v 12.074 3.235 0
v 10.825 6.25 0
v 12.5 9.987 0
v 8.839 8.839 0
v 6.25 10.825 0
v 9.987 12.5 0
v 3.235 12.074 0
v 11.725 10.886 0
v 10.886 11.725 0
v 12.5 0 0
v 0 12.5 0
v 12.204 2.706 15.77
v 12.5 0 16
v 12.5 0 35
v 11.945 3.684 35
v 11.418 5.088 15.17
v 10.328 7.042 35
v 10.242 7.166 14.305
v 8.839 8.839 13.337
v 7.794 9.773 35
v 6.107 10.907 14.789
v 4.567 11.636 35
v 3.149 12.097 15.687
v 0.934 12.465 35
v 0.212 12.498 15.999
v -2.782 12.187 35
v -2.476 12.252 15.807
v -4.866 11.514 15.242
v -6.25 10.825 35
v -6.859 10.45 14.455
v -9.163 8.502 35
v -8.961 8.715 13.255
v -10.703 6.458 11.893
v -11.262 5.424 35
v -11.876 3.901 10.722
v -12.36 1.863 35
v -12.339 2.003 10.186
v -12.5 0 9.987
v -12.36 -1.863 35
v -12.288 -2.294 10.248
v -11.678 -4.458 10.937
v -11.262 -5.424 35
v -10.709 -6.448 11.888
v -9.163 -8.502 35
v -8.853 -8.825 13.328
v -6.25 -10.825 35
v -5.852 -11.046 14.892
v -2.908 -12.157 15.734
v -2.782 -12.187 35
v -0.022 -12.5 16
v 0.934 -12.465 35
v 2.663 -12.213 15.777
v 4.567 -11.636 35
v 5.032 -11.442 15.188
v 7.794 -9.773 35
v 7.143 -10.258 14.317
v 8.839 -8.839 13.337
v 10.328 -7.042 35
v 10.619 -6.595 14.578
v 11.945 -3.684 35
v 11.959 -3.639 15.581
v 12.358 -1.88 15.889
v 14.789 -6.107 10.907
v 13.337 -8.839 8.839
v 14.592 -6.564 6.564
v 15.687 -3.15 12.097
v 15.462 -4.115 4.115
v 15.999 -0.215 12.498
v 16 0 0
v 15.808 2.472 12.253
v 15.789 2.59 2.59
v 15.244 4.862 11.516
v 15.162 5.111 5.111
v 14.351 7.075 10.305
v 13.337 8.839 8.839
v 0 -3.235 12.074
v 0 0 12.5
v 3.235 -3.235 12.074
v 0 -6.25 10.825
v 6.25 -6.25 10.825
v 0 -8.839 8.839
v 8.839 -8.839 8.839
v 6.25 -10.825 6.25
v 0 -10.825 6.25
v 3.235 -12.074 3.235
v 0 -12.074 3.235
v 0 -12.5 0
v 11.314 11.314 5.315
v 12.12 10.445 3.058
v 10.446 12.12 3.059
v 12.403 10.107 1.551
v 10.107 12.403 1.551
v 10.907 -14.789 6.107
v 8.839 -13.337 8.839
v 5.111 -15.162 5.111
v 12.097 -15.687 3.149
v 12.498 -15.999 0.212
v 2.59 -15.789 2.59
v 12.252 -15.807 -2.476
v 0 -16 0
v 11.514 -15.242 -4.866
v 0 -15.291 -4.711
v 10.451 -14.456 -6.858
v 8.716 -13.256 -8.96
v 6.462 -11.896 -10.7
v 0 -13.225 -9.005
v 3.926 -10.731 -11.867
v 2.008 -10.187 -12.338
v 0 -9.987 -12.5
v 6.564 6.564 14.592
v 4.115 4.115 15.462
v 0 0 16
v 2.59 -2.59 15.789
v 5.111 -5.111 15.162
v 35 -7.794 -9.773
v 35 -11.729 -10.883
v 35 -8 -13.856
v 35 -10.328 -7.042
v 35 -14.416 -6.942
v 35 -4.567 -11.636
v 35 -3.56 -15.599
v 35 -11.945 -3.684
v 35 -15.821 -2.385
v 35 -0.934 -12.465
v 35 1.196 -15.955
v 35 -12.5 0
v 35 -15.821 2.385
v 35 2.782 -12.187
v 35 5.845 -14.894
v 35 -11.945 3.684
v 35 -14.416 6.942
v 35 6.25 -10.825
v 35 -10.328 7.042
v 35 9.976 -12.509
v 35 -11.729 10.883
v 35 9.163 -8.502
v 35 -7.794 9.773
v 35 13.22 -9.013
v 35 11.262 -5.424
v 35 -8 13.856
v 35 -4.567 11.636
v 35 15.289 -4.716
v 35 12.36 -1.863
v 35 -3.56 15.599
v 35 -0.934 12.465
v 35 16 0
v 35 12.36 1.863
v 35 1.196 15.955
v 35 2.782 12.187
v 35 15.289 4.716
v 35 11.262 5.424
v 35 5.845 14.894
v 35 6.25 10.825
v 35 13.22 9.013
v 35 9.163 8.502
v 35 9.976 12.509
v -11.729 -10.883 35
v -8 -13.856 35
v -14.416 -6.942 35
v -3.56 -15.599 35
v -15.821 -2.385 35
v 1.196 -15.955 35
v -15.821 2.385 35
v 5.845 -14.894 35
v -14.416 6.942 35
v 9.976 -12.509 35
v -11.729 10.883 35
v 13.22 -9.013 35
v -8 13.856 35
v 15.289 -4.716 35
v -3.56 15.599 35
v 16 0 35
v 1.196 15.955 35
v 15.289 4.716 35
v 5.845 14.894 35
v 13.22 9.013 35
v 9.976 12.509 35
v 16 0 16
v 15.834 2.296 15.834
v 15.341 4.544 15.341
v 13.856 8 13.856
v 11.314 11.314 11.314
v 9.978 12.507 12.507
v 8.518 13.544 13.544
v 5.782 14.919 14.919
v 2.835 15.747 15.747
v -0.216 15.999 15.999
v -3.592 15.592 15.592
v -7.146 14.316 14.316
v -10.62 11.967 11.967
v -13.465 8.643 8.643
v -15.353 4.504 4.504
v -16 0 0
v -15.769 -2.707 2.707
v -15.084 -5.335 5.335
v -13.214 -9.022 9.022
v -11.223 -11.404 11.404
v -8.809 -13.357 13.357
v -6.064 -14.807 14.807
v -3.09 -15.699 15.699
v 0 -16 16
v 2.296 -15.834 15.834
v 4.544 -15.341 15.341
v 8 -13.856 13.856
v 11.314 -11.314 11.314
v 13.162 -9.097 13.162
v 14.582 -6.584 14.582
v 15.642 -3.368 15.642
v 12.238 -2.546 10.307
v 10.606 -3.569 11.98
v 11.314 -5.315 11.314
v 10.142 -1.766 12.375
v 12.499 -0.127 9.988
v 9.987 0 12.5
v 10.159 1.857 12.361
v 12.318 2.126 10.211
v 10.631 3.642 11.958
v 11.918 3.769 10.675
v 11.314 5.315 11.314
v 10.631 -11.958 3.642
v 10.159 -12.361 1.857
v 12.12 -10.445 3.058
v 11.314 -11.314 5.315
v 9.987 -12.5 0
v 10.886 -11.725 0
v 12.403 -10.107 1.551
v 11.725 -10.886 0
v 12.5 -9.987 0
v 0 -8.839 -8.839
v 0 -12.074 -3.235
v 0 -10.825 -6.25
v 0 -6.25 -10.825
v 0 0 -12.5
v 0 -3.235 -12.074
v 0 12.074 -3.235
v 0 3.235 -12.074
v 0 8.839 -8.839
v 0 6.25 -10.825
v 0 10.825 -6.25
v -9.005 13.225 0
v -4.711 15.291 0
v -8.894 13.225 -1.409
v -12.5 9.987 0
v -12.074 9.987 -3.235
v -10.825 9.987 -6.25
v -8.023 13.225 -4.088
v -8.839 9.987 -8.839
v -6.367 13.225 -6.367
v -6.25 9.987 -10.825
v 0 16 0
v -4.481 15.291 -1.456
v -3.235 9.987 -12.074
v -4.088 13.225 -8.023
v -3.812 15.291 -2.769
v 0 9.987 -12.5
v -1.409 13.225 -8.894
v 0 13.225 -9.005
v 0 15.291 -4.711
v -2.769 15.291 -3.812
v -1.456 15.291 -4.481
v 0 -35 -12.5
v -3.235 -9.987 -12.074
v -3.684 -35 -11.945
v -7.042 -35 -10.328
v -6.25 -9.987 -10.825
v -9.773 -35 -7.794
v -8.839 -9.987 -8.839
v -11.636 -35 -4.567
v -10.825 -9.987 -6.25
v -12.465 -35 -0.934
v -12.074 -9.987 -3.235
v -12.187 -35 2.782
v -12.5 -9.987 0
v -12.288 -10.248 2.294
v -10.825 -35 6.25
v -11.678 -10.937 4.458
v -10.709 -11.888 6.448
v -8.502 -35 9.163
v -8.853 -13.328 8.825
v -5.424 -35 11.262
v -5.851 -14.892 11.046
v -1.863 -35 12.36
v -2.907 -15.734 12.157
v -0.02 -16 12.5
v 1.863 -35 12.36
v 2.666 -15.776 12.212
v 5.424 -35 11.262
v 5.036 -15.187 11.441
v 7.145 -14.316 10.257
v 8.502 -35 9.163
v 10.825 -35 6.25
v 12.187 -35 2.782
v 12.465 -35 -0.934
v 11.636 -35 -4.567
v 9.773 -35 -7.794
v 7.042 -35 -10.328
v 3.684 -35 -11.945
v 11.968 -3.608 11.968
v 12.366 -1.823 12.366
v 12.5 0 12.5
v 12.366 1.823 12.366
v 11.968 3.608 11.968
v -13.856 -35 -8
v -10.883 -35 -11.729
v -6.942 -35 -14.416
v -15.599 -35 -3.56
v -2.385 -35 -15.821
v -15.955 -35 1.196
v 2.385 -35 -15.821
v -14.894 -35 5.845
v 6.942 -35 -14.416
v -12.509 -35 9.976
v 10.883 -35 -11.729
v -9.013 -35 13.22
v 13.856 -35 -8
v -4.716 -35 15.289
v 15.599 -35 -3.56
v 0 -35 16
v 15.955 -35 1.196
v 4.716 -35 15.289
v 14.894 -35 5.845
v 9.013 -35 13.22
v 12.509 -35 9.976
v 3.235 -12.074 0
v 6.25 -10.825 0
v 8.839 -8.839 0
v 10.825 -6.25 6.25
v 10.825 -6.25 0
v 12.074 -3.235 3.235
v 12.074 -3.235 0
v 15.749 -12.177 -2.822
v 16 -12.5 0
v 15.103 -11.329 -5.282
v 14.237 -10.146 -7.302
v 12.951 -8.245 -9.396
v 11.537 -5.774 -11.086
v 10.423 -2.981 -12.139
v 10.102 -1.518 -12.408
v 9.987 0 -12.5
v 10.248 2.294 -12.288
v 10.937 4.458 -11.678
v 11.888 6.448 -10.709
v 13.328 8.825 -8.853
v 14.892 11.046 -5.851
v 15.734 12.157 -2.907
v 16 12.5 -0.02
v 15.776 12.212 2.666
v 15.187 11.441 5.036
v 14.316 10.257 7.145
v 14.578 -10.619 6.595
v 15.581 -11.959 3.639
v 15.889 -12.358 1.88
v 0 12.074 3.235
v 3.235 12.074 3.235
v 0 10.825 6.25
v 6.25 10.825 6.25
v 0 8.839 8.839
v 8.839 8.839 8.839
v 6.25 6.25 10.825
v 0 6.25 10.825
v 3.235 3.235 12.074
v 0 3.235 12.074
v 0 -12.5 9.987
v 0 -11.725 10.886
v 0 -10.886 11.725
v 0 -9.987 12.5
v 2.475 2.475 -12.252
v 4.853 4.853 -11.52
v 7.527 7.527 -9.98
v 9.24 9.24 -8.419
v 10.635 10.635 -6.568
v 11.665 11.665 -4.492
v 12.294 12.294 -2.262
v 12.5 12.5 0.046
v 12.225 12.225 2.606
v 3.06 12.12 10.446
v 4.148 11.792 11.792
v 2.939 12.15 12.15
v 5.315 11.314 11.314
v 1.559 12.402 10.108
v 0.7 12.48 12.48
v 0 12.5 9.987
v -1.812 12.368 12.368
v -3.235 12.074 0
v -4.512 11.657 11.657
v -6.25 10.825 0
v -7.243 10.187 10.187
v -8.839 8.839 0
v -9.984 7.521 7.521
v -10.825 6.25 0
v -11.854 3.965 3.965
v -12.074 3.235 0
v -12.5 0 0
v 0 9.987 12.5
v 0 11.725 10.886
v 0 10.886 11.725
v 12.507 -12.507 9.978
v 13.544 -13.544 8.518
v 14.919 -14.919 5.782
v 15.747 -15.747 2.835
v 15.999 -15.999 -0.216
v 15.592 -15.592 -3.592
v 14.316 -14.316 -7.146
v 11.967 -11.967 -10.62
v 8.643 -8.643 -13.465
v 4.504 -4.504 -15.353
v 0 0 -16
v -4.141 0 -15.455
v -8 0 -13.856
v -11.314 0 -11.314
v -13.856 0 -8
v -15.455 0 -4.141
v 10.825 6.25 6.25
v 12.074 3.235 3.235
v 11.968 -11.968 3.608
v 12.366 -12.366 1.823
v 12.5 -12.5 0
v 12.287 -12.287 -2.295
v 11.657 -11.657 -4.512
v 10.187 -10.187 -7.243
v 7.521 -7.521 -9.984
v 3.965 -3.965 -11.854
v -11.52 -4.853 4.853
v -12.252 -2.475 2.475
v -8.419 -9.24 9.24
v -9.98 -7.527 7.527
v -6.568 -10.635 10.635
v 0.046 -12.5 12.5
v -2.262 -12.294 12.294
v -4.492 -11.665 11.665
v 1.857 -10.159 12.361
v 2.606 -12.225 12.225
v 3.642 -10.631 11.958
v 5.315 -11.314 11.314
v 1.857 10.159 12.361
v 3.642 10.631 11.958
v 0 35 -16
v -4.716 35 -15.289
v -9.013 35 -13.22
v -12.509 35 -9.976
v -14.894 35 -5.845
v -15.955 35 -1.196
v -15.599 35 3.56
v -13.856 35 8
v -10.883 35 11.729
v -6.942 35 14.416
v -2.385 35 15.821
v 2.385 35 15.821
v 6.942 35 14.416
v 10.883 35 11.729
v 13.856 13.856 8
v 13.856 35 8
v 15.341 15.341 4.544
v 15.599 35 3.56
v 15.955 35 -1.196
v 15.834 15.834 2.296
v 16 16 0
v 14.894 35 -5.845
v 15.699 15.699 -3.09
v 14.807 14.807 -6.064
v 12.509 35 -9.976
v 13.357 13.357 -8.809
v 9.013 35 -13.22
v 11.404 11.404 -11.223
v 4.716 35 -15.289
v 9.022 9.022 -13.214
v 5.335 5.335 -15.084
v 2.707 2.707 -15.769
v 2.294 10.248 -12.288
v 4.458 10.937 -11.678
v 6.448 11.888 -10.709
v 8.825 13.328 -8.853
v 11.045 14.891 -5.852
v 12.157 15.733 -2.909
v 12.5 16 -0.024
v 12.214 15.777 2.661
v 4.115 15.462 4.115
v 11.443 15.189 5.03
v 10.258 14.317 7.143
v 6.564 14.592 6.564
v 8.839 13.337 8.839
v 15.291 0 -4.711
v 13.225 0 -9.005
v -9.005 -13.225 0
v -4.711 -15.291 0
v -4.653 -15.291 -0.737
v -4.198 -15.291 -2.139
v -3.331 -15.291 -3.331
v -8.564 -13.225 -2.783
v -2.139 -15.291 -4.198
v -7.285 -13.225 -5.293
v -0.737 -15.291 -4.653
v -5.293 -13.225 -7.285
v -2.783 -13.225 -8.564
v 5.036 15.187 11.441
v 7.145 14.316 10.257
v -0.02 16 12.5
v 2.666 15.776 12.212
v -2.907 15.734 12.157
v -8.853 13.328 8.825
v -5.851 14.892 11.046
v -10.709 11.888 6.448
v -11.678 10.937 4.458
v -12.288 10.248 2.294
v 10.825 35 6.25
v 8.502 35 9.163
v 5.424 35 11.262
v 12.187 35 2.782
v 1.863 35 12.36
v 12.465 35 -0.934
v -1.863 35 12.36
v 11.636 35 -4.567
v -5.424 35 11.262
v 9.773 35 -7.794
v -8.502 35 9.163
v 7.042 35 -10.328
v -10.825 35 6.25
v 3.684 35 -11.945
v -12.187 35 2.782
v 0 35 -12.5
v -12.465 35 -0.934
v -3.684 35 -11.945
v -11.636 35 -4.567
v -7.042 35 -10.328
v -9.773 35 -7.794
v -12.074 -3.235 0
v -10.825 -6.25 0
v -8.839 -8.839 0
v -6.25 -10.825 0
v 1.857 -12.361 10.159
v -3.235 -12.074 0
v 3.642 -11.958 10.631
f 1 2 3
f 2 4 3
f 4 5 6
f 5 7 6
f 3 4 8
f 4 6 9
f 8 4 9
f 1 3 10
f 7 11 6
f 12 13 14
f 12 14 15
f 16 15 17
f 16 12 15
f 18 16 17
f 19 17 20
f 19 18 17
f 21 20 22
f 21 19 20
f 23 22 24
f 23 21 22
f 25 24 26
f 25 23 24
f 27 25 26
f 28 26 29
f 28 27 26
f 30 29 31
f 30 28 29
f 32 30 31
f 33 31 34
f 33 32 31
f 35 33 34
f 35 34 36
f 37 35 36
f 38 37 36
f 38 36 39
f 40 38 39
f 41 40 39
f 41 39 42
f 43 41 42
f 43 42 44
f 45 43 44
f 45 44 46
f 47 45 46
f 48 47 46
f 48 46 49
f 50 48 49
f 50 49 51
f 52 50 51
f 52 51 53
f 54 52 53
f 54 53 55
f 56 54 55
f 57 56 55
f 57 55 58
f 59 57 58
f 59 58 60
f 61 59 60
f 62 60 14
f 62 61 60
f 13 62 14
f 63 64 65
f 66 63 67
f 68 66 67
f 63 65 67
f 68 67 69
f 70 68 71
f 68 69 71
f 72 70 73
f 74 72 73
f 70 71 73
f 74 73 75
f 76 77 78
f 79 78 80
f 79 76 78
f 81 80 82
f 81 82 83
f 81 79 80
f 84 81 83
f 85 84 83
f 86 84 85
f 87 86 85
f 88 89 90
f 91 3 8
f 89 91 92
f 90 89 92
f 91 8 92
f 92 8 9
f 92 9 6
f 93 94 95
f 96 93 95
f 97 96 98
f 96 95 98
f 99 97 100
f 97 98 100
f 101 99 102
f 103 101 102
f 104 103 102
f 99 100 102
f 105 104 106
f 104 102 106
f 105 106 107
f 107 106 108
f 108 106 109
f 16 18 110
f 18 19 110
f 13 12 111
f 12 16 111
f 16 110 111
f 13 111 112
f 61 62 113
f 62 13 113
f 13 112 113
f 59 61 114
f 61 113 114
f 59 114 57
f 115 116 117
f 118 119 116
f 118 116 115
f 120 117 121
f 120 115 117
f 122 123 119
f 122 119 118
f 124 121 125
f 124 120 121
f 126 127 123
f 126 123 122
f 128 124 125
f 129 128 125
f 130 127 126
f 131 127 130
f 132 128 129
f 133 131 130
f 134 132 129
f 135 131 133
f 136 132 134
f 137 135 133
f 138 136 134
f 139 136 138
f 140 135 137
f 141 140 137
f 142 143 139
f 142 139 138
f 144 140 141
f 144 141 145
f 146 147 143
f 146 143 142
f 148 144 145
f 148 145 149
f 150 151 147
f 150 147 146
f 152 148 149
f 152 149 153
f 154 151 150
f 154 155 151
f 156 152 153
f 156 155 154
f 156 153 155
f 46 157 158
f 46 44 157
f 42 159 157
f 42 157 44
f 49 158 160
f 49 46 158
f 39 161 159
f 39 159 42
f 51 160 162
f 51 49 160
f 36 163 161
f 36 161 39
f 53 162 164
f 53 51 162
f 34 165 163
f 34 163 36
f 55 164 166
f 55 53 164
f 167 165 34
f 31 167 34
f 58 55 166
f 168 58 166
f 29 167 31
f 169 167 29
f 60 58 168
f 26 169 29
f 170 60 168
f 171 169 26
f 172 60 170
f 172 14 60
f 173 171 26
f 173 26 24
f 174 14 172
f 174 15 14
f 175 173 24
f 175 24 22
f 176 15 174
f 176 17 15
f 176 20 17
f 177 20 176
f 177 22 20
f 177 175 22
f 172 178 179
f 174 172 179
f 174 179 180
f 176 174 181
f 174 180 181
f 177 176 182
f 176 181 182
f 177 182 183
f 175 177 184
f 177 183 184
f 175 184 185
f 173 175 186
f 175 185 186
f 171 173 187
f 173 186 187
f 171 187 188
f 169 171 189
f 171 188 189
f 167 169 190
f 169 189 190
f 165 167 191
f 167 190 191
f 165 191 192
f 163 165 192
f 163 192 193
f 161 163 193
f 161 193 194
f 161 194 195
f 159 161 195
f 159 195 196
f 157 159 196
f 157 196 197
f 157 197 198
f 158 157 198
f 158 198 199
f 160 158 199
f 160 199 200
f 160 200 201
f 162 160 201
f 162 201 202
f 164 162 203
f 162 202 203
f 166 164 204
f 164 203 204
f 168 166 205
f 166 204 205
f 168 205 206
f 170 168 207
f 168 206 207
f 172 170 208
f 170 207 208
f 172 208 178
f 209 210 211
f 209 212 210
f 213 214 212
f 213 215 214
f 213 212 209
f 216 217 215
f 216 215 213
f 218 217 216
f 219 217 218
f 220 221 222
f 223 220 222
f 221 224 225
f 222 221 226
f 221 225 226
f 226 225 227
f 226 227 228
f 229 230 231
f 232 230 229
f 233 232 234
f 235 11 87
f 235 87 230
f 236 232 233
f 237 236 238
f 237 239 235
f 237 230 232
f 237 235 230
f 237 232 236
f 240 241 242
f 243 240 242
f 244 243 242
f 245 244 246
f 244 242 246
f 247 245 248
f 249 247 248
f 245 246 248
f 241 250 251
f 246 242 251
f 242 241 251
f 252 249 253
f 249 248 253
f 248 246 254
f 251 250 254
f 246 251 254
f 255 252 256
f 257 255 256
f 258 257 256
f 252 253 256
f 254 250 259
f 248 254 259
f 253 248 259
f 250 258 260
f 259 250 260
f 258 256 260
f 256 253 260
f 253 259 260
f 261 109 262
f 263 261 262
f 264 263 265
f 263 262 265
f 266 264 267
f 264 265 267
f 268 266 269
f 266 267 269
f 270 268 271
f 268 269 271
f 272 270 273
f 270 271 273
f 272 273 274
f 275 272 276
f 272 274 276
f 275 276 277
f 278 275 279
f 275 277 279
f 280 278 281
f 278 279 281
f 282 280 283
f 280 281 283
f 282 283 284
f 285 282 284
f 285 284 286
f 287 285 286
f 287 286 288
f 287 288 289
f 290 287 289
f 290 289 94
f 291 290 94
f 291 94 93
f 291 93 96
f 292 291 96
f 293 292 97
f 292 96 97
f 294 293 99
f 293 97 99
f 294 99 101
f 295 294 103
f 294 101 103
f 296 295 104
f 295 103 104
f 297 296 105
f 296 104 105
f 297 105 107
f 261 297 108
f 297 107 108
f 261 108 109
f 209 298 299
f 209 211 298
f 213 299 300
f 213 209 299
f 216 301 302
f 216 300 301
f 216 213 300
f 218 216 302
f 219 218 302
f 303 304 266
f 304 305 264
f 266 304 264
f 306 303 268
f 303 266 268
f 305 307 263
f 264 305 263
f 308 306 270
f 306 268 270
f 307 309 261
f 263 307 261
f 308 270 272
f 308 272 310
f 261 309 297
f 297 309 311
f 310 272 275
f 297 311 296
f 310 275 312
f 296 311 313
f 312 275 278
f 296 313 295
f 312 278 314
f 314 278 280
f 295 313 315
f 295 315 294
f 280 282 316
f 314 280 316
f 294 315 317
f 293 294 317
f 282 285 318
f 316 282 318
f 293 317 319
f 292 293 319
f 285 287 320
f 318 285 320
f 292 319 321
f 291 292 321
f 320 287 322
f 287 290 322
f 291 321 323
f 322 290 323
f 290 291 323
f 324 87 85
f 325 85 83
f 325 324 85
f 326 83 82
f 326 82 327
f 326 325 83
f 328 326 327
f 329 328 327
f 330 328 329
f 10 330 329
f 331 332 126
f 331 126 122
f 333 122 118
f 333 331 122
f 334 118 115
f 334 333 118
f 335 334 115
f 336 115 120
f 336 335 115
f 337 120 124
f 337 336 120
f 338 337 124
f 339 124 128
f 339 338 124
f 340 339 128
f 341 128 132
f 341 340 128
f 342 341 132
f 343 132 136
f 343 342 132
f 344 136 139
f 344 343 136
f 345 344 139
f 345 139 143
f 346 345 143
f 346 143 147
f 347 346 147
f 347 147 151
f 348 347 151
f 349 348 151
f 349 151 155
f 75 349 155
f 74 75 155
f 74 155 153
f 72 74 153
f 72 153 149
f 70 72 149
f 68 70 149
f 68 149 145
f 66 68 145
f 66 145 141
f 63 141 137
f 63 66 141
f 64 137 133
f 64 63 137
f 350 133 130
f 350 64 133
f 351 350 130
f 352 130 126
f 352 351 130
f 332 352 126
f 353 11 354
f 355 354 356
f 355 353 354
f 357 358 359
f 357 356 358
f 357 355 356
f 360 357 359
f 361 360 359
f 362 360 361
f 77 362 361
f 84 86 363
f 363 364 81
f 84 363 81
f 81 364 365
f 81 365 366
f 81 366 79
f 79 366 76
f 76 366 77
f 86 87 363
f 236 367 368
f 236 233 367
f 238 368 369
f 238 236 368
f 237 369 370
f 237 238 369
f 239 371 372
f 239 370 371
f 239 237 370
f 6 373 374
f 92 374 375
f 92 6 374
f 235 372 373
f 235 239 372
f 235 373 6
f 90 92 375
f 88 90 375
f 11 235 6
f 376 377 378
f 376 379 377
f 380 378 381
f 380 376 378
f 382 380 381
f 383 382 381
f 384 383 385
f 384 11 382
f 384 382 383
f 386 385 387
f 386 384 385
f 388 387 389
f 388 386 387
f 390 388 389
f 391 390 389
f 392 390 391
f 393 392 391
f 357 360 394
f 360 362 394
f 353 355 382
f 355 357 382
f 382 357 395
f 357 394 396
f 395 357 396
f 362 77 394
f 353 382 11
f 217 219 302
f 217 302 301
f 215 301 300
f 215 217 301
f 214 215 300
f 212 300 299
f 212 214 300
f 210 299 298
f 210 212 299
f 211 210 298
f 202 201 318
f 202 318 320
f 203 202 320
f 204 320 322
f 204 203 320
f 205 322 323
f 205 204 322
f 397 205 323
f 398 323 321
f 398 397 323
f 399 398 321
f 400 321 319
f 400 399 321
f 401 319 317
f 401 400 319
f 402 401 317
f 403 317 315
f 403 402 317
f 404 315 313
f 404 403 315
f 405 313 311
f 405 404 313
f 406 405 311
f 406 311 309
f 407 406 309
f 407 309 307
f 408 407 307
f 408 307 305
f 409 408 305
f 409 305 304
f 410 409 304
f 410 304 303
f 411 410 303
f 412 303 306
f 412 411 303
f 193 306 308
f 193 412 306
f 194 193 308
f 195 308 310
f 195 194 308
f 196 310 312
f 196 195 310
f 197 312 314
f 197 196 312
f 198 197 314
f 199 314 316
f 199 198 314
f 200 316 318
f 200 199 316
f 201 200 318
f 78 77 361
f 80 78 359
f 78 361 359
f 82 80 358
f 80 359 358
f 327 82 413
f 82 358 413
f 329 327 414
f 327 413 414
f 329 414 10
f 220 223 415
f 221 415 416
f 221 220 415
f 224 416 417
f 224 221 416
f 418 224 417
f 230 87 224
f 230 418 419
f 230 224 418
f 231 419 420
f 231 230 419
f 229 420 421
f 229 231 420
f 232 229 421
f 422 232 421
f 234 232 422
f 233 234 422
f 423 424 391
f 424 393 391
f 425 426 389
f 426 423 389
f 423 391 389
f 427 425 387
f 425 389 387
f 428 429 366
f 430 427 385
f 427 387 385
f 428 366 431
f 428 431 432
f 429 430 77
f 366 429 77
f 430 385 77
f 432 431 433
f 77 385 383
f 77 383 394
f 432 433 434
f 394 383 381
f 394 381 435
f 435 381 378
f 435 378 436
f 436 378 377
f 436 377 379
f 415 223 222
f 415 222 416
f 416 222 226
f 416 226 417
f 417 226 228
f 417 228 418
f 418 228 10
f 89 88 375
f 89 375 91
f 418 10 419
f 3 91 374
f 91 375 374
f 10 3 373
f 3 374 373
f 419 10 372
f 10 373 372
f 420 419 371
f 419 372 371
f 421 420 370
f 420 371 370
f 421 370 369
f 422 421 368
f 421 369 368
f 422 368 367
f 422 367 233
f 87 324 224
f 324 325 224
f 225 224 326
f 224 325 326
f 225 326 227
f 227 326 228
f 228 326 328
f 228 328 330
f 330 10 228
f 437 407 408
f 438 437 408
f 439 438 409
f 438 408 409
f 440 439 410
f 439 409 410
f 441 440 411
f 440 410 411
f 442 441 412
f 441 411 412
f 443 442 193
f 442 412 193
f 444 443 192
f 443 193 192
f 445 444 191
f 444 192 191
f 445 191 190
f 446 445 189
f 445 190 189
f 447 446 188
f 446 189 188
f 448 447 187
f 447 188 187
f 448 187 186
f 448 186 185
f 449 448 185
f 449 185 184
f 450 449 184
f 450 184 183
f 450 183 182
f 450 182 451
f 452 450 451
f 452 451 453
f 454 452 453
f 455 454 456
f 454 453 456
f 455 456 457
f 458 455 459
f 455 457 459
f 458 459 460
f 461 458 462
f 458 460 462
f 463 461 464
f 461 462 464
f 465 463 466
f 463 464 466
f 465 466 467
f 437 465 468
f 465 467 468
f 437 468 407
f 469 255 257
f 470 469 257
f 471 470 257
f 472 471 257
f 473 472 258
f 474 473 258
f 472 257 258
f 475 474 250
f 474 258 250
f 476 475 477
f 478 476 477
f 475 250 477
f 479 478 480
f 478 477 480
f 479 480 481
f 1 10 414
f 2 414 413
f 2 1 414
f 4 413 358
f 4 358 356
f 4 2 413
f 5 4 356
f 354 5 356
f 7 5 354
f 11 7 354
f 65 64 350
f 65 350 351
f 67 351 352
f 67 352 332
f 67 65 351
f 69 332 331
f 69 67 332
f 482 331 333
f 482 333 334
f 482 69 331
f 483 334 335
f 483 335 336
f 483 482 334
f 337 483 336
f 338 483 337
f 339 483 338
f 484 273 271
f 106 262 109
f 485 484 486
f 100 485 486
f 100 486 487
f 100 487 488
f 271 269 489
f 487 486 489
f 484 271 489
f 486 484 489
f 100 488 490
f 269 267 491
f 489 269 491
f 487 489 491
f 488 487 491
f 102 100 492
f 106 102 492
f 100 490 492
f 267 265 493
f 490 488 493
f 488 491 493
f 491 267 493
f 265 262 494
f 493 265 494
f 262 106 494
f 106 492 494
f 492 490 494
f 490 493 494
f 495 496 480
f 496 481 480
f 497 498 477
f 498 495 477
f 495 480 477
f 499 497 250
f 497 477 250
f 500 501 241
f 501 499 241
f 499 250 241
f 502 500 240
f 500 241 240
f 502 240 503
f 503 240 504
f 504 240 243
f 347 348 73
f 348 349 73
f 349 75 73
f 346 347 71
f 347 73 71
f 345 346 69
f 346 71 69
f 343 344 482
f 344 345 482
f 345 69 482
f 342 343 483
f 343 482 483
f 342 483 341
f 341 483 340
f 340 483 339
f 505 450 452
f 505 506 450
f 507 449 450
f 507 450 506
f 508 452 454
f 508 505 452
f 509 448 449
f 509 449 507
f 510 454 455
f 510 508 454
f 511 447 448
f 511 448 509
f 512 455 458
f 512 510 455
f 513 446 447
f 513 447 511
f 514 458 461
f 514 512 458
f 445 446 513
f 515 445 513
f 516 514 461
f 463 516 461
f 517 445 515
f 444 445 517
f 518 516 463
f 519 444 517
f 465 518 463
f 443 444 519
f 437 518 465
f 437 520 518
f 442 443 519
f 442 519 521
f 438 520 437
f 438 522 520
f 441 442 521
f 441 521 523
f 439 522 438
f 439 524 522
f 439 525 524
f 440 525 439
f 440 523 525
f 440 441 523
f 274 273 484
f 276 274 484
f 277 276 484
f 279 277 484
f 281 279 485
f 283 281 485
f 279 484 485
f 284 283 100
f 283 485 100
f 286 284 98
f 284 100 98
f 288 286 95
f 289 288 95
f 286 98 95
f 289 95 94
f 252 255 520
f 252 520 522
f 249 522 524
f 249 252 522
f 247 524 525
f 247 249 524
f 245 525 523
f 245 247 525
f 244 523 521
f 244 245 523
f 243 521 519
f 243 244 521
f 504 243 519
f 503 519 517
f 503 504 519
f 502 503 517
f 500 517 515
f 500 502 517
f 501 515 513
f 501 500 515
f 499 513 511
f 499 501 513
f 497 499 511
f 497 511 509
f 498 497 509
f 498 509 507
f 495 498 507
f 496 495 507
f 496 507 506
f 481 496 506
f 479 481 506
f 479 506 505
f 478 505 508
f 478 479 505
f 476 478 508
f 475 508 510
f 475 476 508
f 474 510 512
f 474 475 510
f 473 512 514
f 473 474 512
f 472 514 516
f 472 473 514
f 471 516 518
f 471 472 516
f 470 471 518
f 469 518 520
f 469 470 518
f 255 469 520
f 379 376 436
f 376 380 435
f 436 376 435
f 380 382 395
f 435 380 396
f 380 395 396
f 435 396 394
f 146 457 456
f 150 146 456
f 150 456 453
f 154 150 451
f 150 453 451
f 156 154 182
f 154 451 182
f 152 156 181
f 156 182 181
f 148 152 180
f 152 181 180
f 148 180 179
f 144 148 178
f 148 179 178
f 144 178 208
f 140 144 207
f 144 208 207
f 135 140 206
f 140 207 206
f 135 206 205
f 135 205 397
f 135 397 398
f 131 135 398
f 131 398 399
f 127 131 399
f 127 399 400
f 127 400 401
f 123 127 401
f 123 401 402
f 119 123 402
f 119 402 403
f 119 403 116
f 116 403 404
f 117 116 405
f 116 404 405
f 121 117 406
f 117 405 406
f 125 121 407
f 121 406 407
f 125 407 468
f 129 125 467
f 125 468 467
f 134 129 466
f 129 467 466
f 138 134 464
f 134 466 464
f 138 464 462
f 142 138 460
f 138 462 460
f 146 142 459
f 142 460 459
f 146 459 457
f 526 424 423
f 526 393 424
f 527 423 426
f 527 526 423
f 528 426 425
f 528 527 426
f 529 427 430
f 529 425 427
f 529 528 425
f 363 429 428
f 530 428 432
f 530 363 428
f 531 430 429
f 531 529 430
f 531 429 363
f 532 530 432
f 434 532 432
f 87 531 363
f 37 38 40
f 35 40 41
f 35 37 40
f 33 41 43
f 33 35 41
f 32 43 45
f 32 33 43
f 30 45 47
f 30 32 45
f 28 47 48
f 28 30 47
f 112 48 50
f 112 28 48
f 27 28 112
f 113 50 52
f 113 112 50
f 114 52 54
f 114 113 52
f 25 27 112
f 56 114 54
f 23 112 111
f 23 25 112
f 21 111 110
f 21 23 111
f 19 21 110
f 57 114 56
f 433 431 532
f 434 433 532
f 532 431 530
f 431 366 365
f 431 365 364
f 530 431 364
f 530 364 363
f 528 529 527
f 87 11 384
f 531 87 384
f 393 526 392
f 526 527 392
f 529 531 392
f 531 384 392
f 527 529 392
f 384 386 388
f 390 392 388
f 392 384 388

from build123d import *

# Parameters (mm, degrees)
SKETCH_1_R      = 16
SKETCH_1_R_2    = 12.5
EXTRUDE_1_DEPTH = 35
SKETCH_2_R      = 16
SKETCH_2_R_2    = 12.5
EXTRUDE_2_DEPTH = 35
SKETCH_4_R      = 16
SKETCH_4_R_2    = 12.5
EXTRUDE_3_DEPTH = 35
REVOLVE_1_ANGLE = 90
SKETCH_5_R      = 16
SKETCH_5_R_2    = 12.5
EXTRUDE_4_DEPTH = 35


with BuildPart() as part:
    # 草图1 → 凸台-拉伸1 (new body)
    with BuildSketch(Plane.XY):
        Circle(SKETCH_1_R)
        Circle(SKETCH_1_R_2, mode=Mode.SUBTRACT)
    extrude(amount=EXTRUDE_1_DEPTH)

    # 草图2 → 凸台-拉伸2 (add)
    with BuildSketch(Plane(origin=(0, 0, 0), x_dir=(0, 0, -1), z_dir=(1, 0, 0))):
        with Locations(Location((0, 0, 0), (0, 0, 90))):
            Circle(SKETCH_2_R)
        with Locations(Location((0, 0, 0), (0, 0, 270))):
            Circle(SKETCH_2_R_2, mode=Mode.SUBTRACT)
    extrude(amount=EXTRUDE_2_DEPTH)

    # 草图4 → 凸台-拉伸3 (add)
    with BuildSketch(Plane(origin=(0, 0, 0), x_dir=(1, 0, 0), z_dir=(0, 1, 0))):
        with Locations(Location((0, 0, 0), (0, 0, 90))):
            Circle(SKETCH_4_R)
        with Locations(Location((0, 0, 0), (0, 0, 90))):
            Circle(SKETCH_4_R_2, mode=Mode.SUBTRACT)
    extrude(amount=EXTRUDE_3_DEPTH)

    # 草图3 → 旋转1 (revolve)
    with BuildSketch(Plane.XY):
        with BuildLine():
            Line((0, 16), (0, -16))
            ThreePointArc((0, -16), (-16, 0), (0, 16))
        make_face()
    revolve(axis=Axis((0, 16, 0), (0, -1, 0)), revolution_arc=REVOLVE_1_ANGLE)

    # 草图5 → 凸台-拉伸4 (add)
    with BuildSketch(Plane(origin=(0, 0, 0), x_dir=(1, 0, 0), z_dir=(0, 1, 0))):
        with Locations(Location((0, 0, 0), (0, 0, 270))):
            Circle(SKETCH_5_R)
        with Locations(Location((0, 0, 0), (0, 0, 90))):
            Circle(SKETCH_5_R_2, mode=Mode.SUBTRACT)
    extrude(amount=-EXTRUDE_4_DEPTH)


solid = part.part
